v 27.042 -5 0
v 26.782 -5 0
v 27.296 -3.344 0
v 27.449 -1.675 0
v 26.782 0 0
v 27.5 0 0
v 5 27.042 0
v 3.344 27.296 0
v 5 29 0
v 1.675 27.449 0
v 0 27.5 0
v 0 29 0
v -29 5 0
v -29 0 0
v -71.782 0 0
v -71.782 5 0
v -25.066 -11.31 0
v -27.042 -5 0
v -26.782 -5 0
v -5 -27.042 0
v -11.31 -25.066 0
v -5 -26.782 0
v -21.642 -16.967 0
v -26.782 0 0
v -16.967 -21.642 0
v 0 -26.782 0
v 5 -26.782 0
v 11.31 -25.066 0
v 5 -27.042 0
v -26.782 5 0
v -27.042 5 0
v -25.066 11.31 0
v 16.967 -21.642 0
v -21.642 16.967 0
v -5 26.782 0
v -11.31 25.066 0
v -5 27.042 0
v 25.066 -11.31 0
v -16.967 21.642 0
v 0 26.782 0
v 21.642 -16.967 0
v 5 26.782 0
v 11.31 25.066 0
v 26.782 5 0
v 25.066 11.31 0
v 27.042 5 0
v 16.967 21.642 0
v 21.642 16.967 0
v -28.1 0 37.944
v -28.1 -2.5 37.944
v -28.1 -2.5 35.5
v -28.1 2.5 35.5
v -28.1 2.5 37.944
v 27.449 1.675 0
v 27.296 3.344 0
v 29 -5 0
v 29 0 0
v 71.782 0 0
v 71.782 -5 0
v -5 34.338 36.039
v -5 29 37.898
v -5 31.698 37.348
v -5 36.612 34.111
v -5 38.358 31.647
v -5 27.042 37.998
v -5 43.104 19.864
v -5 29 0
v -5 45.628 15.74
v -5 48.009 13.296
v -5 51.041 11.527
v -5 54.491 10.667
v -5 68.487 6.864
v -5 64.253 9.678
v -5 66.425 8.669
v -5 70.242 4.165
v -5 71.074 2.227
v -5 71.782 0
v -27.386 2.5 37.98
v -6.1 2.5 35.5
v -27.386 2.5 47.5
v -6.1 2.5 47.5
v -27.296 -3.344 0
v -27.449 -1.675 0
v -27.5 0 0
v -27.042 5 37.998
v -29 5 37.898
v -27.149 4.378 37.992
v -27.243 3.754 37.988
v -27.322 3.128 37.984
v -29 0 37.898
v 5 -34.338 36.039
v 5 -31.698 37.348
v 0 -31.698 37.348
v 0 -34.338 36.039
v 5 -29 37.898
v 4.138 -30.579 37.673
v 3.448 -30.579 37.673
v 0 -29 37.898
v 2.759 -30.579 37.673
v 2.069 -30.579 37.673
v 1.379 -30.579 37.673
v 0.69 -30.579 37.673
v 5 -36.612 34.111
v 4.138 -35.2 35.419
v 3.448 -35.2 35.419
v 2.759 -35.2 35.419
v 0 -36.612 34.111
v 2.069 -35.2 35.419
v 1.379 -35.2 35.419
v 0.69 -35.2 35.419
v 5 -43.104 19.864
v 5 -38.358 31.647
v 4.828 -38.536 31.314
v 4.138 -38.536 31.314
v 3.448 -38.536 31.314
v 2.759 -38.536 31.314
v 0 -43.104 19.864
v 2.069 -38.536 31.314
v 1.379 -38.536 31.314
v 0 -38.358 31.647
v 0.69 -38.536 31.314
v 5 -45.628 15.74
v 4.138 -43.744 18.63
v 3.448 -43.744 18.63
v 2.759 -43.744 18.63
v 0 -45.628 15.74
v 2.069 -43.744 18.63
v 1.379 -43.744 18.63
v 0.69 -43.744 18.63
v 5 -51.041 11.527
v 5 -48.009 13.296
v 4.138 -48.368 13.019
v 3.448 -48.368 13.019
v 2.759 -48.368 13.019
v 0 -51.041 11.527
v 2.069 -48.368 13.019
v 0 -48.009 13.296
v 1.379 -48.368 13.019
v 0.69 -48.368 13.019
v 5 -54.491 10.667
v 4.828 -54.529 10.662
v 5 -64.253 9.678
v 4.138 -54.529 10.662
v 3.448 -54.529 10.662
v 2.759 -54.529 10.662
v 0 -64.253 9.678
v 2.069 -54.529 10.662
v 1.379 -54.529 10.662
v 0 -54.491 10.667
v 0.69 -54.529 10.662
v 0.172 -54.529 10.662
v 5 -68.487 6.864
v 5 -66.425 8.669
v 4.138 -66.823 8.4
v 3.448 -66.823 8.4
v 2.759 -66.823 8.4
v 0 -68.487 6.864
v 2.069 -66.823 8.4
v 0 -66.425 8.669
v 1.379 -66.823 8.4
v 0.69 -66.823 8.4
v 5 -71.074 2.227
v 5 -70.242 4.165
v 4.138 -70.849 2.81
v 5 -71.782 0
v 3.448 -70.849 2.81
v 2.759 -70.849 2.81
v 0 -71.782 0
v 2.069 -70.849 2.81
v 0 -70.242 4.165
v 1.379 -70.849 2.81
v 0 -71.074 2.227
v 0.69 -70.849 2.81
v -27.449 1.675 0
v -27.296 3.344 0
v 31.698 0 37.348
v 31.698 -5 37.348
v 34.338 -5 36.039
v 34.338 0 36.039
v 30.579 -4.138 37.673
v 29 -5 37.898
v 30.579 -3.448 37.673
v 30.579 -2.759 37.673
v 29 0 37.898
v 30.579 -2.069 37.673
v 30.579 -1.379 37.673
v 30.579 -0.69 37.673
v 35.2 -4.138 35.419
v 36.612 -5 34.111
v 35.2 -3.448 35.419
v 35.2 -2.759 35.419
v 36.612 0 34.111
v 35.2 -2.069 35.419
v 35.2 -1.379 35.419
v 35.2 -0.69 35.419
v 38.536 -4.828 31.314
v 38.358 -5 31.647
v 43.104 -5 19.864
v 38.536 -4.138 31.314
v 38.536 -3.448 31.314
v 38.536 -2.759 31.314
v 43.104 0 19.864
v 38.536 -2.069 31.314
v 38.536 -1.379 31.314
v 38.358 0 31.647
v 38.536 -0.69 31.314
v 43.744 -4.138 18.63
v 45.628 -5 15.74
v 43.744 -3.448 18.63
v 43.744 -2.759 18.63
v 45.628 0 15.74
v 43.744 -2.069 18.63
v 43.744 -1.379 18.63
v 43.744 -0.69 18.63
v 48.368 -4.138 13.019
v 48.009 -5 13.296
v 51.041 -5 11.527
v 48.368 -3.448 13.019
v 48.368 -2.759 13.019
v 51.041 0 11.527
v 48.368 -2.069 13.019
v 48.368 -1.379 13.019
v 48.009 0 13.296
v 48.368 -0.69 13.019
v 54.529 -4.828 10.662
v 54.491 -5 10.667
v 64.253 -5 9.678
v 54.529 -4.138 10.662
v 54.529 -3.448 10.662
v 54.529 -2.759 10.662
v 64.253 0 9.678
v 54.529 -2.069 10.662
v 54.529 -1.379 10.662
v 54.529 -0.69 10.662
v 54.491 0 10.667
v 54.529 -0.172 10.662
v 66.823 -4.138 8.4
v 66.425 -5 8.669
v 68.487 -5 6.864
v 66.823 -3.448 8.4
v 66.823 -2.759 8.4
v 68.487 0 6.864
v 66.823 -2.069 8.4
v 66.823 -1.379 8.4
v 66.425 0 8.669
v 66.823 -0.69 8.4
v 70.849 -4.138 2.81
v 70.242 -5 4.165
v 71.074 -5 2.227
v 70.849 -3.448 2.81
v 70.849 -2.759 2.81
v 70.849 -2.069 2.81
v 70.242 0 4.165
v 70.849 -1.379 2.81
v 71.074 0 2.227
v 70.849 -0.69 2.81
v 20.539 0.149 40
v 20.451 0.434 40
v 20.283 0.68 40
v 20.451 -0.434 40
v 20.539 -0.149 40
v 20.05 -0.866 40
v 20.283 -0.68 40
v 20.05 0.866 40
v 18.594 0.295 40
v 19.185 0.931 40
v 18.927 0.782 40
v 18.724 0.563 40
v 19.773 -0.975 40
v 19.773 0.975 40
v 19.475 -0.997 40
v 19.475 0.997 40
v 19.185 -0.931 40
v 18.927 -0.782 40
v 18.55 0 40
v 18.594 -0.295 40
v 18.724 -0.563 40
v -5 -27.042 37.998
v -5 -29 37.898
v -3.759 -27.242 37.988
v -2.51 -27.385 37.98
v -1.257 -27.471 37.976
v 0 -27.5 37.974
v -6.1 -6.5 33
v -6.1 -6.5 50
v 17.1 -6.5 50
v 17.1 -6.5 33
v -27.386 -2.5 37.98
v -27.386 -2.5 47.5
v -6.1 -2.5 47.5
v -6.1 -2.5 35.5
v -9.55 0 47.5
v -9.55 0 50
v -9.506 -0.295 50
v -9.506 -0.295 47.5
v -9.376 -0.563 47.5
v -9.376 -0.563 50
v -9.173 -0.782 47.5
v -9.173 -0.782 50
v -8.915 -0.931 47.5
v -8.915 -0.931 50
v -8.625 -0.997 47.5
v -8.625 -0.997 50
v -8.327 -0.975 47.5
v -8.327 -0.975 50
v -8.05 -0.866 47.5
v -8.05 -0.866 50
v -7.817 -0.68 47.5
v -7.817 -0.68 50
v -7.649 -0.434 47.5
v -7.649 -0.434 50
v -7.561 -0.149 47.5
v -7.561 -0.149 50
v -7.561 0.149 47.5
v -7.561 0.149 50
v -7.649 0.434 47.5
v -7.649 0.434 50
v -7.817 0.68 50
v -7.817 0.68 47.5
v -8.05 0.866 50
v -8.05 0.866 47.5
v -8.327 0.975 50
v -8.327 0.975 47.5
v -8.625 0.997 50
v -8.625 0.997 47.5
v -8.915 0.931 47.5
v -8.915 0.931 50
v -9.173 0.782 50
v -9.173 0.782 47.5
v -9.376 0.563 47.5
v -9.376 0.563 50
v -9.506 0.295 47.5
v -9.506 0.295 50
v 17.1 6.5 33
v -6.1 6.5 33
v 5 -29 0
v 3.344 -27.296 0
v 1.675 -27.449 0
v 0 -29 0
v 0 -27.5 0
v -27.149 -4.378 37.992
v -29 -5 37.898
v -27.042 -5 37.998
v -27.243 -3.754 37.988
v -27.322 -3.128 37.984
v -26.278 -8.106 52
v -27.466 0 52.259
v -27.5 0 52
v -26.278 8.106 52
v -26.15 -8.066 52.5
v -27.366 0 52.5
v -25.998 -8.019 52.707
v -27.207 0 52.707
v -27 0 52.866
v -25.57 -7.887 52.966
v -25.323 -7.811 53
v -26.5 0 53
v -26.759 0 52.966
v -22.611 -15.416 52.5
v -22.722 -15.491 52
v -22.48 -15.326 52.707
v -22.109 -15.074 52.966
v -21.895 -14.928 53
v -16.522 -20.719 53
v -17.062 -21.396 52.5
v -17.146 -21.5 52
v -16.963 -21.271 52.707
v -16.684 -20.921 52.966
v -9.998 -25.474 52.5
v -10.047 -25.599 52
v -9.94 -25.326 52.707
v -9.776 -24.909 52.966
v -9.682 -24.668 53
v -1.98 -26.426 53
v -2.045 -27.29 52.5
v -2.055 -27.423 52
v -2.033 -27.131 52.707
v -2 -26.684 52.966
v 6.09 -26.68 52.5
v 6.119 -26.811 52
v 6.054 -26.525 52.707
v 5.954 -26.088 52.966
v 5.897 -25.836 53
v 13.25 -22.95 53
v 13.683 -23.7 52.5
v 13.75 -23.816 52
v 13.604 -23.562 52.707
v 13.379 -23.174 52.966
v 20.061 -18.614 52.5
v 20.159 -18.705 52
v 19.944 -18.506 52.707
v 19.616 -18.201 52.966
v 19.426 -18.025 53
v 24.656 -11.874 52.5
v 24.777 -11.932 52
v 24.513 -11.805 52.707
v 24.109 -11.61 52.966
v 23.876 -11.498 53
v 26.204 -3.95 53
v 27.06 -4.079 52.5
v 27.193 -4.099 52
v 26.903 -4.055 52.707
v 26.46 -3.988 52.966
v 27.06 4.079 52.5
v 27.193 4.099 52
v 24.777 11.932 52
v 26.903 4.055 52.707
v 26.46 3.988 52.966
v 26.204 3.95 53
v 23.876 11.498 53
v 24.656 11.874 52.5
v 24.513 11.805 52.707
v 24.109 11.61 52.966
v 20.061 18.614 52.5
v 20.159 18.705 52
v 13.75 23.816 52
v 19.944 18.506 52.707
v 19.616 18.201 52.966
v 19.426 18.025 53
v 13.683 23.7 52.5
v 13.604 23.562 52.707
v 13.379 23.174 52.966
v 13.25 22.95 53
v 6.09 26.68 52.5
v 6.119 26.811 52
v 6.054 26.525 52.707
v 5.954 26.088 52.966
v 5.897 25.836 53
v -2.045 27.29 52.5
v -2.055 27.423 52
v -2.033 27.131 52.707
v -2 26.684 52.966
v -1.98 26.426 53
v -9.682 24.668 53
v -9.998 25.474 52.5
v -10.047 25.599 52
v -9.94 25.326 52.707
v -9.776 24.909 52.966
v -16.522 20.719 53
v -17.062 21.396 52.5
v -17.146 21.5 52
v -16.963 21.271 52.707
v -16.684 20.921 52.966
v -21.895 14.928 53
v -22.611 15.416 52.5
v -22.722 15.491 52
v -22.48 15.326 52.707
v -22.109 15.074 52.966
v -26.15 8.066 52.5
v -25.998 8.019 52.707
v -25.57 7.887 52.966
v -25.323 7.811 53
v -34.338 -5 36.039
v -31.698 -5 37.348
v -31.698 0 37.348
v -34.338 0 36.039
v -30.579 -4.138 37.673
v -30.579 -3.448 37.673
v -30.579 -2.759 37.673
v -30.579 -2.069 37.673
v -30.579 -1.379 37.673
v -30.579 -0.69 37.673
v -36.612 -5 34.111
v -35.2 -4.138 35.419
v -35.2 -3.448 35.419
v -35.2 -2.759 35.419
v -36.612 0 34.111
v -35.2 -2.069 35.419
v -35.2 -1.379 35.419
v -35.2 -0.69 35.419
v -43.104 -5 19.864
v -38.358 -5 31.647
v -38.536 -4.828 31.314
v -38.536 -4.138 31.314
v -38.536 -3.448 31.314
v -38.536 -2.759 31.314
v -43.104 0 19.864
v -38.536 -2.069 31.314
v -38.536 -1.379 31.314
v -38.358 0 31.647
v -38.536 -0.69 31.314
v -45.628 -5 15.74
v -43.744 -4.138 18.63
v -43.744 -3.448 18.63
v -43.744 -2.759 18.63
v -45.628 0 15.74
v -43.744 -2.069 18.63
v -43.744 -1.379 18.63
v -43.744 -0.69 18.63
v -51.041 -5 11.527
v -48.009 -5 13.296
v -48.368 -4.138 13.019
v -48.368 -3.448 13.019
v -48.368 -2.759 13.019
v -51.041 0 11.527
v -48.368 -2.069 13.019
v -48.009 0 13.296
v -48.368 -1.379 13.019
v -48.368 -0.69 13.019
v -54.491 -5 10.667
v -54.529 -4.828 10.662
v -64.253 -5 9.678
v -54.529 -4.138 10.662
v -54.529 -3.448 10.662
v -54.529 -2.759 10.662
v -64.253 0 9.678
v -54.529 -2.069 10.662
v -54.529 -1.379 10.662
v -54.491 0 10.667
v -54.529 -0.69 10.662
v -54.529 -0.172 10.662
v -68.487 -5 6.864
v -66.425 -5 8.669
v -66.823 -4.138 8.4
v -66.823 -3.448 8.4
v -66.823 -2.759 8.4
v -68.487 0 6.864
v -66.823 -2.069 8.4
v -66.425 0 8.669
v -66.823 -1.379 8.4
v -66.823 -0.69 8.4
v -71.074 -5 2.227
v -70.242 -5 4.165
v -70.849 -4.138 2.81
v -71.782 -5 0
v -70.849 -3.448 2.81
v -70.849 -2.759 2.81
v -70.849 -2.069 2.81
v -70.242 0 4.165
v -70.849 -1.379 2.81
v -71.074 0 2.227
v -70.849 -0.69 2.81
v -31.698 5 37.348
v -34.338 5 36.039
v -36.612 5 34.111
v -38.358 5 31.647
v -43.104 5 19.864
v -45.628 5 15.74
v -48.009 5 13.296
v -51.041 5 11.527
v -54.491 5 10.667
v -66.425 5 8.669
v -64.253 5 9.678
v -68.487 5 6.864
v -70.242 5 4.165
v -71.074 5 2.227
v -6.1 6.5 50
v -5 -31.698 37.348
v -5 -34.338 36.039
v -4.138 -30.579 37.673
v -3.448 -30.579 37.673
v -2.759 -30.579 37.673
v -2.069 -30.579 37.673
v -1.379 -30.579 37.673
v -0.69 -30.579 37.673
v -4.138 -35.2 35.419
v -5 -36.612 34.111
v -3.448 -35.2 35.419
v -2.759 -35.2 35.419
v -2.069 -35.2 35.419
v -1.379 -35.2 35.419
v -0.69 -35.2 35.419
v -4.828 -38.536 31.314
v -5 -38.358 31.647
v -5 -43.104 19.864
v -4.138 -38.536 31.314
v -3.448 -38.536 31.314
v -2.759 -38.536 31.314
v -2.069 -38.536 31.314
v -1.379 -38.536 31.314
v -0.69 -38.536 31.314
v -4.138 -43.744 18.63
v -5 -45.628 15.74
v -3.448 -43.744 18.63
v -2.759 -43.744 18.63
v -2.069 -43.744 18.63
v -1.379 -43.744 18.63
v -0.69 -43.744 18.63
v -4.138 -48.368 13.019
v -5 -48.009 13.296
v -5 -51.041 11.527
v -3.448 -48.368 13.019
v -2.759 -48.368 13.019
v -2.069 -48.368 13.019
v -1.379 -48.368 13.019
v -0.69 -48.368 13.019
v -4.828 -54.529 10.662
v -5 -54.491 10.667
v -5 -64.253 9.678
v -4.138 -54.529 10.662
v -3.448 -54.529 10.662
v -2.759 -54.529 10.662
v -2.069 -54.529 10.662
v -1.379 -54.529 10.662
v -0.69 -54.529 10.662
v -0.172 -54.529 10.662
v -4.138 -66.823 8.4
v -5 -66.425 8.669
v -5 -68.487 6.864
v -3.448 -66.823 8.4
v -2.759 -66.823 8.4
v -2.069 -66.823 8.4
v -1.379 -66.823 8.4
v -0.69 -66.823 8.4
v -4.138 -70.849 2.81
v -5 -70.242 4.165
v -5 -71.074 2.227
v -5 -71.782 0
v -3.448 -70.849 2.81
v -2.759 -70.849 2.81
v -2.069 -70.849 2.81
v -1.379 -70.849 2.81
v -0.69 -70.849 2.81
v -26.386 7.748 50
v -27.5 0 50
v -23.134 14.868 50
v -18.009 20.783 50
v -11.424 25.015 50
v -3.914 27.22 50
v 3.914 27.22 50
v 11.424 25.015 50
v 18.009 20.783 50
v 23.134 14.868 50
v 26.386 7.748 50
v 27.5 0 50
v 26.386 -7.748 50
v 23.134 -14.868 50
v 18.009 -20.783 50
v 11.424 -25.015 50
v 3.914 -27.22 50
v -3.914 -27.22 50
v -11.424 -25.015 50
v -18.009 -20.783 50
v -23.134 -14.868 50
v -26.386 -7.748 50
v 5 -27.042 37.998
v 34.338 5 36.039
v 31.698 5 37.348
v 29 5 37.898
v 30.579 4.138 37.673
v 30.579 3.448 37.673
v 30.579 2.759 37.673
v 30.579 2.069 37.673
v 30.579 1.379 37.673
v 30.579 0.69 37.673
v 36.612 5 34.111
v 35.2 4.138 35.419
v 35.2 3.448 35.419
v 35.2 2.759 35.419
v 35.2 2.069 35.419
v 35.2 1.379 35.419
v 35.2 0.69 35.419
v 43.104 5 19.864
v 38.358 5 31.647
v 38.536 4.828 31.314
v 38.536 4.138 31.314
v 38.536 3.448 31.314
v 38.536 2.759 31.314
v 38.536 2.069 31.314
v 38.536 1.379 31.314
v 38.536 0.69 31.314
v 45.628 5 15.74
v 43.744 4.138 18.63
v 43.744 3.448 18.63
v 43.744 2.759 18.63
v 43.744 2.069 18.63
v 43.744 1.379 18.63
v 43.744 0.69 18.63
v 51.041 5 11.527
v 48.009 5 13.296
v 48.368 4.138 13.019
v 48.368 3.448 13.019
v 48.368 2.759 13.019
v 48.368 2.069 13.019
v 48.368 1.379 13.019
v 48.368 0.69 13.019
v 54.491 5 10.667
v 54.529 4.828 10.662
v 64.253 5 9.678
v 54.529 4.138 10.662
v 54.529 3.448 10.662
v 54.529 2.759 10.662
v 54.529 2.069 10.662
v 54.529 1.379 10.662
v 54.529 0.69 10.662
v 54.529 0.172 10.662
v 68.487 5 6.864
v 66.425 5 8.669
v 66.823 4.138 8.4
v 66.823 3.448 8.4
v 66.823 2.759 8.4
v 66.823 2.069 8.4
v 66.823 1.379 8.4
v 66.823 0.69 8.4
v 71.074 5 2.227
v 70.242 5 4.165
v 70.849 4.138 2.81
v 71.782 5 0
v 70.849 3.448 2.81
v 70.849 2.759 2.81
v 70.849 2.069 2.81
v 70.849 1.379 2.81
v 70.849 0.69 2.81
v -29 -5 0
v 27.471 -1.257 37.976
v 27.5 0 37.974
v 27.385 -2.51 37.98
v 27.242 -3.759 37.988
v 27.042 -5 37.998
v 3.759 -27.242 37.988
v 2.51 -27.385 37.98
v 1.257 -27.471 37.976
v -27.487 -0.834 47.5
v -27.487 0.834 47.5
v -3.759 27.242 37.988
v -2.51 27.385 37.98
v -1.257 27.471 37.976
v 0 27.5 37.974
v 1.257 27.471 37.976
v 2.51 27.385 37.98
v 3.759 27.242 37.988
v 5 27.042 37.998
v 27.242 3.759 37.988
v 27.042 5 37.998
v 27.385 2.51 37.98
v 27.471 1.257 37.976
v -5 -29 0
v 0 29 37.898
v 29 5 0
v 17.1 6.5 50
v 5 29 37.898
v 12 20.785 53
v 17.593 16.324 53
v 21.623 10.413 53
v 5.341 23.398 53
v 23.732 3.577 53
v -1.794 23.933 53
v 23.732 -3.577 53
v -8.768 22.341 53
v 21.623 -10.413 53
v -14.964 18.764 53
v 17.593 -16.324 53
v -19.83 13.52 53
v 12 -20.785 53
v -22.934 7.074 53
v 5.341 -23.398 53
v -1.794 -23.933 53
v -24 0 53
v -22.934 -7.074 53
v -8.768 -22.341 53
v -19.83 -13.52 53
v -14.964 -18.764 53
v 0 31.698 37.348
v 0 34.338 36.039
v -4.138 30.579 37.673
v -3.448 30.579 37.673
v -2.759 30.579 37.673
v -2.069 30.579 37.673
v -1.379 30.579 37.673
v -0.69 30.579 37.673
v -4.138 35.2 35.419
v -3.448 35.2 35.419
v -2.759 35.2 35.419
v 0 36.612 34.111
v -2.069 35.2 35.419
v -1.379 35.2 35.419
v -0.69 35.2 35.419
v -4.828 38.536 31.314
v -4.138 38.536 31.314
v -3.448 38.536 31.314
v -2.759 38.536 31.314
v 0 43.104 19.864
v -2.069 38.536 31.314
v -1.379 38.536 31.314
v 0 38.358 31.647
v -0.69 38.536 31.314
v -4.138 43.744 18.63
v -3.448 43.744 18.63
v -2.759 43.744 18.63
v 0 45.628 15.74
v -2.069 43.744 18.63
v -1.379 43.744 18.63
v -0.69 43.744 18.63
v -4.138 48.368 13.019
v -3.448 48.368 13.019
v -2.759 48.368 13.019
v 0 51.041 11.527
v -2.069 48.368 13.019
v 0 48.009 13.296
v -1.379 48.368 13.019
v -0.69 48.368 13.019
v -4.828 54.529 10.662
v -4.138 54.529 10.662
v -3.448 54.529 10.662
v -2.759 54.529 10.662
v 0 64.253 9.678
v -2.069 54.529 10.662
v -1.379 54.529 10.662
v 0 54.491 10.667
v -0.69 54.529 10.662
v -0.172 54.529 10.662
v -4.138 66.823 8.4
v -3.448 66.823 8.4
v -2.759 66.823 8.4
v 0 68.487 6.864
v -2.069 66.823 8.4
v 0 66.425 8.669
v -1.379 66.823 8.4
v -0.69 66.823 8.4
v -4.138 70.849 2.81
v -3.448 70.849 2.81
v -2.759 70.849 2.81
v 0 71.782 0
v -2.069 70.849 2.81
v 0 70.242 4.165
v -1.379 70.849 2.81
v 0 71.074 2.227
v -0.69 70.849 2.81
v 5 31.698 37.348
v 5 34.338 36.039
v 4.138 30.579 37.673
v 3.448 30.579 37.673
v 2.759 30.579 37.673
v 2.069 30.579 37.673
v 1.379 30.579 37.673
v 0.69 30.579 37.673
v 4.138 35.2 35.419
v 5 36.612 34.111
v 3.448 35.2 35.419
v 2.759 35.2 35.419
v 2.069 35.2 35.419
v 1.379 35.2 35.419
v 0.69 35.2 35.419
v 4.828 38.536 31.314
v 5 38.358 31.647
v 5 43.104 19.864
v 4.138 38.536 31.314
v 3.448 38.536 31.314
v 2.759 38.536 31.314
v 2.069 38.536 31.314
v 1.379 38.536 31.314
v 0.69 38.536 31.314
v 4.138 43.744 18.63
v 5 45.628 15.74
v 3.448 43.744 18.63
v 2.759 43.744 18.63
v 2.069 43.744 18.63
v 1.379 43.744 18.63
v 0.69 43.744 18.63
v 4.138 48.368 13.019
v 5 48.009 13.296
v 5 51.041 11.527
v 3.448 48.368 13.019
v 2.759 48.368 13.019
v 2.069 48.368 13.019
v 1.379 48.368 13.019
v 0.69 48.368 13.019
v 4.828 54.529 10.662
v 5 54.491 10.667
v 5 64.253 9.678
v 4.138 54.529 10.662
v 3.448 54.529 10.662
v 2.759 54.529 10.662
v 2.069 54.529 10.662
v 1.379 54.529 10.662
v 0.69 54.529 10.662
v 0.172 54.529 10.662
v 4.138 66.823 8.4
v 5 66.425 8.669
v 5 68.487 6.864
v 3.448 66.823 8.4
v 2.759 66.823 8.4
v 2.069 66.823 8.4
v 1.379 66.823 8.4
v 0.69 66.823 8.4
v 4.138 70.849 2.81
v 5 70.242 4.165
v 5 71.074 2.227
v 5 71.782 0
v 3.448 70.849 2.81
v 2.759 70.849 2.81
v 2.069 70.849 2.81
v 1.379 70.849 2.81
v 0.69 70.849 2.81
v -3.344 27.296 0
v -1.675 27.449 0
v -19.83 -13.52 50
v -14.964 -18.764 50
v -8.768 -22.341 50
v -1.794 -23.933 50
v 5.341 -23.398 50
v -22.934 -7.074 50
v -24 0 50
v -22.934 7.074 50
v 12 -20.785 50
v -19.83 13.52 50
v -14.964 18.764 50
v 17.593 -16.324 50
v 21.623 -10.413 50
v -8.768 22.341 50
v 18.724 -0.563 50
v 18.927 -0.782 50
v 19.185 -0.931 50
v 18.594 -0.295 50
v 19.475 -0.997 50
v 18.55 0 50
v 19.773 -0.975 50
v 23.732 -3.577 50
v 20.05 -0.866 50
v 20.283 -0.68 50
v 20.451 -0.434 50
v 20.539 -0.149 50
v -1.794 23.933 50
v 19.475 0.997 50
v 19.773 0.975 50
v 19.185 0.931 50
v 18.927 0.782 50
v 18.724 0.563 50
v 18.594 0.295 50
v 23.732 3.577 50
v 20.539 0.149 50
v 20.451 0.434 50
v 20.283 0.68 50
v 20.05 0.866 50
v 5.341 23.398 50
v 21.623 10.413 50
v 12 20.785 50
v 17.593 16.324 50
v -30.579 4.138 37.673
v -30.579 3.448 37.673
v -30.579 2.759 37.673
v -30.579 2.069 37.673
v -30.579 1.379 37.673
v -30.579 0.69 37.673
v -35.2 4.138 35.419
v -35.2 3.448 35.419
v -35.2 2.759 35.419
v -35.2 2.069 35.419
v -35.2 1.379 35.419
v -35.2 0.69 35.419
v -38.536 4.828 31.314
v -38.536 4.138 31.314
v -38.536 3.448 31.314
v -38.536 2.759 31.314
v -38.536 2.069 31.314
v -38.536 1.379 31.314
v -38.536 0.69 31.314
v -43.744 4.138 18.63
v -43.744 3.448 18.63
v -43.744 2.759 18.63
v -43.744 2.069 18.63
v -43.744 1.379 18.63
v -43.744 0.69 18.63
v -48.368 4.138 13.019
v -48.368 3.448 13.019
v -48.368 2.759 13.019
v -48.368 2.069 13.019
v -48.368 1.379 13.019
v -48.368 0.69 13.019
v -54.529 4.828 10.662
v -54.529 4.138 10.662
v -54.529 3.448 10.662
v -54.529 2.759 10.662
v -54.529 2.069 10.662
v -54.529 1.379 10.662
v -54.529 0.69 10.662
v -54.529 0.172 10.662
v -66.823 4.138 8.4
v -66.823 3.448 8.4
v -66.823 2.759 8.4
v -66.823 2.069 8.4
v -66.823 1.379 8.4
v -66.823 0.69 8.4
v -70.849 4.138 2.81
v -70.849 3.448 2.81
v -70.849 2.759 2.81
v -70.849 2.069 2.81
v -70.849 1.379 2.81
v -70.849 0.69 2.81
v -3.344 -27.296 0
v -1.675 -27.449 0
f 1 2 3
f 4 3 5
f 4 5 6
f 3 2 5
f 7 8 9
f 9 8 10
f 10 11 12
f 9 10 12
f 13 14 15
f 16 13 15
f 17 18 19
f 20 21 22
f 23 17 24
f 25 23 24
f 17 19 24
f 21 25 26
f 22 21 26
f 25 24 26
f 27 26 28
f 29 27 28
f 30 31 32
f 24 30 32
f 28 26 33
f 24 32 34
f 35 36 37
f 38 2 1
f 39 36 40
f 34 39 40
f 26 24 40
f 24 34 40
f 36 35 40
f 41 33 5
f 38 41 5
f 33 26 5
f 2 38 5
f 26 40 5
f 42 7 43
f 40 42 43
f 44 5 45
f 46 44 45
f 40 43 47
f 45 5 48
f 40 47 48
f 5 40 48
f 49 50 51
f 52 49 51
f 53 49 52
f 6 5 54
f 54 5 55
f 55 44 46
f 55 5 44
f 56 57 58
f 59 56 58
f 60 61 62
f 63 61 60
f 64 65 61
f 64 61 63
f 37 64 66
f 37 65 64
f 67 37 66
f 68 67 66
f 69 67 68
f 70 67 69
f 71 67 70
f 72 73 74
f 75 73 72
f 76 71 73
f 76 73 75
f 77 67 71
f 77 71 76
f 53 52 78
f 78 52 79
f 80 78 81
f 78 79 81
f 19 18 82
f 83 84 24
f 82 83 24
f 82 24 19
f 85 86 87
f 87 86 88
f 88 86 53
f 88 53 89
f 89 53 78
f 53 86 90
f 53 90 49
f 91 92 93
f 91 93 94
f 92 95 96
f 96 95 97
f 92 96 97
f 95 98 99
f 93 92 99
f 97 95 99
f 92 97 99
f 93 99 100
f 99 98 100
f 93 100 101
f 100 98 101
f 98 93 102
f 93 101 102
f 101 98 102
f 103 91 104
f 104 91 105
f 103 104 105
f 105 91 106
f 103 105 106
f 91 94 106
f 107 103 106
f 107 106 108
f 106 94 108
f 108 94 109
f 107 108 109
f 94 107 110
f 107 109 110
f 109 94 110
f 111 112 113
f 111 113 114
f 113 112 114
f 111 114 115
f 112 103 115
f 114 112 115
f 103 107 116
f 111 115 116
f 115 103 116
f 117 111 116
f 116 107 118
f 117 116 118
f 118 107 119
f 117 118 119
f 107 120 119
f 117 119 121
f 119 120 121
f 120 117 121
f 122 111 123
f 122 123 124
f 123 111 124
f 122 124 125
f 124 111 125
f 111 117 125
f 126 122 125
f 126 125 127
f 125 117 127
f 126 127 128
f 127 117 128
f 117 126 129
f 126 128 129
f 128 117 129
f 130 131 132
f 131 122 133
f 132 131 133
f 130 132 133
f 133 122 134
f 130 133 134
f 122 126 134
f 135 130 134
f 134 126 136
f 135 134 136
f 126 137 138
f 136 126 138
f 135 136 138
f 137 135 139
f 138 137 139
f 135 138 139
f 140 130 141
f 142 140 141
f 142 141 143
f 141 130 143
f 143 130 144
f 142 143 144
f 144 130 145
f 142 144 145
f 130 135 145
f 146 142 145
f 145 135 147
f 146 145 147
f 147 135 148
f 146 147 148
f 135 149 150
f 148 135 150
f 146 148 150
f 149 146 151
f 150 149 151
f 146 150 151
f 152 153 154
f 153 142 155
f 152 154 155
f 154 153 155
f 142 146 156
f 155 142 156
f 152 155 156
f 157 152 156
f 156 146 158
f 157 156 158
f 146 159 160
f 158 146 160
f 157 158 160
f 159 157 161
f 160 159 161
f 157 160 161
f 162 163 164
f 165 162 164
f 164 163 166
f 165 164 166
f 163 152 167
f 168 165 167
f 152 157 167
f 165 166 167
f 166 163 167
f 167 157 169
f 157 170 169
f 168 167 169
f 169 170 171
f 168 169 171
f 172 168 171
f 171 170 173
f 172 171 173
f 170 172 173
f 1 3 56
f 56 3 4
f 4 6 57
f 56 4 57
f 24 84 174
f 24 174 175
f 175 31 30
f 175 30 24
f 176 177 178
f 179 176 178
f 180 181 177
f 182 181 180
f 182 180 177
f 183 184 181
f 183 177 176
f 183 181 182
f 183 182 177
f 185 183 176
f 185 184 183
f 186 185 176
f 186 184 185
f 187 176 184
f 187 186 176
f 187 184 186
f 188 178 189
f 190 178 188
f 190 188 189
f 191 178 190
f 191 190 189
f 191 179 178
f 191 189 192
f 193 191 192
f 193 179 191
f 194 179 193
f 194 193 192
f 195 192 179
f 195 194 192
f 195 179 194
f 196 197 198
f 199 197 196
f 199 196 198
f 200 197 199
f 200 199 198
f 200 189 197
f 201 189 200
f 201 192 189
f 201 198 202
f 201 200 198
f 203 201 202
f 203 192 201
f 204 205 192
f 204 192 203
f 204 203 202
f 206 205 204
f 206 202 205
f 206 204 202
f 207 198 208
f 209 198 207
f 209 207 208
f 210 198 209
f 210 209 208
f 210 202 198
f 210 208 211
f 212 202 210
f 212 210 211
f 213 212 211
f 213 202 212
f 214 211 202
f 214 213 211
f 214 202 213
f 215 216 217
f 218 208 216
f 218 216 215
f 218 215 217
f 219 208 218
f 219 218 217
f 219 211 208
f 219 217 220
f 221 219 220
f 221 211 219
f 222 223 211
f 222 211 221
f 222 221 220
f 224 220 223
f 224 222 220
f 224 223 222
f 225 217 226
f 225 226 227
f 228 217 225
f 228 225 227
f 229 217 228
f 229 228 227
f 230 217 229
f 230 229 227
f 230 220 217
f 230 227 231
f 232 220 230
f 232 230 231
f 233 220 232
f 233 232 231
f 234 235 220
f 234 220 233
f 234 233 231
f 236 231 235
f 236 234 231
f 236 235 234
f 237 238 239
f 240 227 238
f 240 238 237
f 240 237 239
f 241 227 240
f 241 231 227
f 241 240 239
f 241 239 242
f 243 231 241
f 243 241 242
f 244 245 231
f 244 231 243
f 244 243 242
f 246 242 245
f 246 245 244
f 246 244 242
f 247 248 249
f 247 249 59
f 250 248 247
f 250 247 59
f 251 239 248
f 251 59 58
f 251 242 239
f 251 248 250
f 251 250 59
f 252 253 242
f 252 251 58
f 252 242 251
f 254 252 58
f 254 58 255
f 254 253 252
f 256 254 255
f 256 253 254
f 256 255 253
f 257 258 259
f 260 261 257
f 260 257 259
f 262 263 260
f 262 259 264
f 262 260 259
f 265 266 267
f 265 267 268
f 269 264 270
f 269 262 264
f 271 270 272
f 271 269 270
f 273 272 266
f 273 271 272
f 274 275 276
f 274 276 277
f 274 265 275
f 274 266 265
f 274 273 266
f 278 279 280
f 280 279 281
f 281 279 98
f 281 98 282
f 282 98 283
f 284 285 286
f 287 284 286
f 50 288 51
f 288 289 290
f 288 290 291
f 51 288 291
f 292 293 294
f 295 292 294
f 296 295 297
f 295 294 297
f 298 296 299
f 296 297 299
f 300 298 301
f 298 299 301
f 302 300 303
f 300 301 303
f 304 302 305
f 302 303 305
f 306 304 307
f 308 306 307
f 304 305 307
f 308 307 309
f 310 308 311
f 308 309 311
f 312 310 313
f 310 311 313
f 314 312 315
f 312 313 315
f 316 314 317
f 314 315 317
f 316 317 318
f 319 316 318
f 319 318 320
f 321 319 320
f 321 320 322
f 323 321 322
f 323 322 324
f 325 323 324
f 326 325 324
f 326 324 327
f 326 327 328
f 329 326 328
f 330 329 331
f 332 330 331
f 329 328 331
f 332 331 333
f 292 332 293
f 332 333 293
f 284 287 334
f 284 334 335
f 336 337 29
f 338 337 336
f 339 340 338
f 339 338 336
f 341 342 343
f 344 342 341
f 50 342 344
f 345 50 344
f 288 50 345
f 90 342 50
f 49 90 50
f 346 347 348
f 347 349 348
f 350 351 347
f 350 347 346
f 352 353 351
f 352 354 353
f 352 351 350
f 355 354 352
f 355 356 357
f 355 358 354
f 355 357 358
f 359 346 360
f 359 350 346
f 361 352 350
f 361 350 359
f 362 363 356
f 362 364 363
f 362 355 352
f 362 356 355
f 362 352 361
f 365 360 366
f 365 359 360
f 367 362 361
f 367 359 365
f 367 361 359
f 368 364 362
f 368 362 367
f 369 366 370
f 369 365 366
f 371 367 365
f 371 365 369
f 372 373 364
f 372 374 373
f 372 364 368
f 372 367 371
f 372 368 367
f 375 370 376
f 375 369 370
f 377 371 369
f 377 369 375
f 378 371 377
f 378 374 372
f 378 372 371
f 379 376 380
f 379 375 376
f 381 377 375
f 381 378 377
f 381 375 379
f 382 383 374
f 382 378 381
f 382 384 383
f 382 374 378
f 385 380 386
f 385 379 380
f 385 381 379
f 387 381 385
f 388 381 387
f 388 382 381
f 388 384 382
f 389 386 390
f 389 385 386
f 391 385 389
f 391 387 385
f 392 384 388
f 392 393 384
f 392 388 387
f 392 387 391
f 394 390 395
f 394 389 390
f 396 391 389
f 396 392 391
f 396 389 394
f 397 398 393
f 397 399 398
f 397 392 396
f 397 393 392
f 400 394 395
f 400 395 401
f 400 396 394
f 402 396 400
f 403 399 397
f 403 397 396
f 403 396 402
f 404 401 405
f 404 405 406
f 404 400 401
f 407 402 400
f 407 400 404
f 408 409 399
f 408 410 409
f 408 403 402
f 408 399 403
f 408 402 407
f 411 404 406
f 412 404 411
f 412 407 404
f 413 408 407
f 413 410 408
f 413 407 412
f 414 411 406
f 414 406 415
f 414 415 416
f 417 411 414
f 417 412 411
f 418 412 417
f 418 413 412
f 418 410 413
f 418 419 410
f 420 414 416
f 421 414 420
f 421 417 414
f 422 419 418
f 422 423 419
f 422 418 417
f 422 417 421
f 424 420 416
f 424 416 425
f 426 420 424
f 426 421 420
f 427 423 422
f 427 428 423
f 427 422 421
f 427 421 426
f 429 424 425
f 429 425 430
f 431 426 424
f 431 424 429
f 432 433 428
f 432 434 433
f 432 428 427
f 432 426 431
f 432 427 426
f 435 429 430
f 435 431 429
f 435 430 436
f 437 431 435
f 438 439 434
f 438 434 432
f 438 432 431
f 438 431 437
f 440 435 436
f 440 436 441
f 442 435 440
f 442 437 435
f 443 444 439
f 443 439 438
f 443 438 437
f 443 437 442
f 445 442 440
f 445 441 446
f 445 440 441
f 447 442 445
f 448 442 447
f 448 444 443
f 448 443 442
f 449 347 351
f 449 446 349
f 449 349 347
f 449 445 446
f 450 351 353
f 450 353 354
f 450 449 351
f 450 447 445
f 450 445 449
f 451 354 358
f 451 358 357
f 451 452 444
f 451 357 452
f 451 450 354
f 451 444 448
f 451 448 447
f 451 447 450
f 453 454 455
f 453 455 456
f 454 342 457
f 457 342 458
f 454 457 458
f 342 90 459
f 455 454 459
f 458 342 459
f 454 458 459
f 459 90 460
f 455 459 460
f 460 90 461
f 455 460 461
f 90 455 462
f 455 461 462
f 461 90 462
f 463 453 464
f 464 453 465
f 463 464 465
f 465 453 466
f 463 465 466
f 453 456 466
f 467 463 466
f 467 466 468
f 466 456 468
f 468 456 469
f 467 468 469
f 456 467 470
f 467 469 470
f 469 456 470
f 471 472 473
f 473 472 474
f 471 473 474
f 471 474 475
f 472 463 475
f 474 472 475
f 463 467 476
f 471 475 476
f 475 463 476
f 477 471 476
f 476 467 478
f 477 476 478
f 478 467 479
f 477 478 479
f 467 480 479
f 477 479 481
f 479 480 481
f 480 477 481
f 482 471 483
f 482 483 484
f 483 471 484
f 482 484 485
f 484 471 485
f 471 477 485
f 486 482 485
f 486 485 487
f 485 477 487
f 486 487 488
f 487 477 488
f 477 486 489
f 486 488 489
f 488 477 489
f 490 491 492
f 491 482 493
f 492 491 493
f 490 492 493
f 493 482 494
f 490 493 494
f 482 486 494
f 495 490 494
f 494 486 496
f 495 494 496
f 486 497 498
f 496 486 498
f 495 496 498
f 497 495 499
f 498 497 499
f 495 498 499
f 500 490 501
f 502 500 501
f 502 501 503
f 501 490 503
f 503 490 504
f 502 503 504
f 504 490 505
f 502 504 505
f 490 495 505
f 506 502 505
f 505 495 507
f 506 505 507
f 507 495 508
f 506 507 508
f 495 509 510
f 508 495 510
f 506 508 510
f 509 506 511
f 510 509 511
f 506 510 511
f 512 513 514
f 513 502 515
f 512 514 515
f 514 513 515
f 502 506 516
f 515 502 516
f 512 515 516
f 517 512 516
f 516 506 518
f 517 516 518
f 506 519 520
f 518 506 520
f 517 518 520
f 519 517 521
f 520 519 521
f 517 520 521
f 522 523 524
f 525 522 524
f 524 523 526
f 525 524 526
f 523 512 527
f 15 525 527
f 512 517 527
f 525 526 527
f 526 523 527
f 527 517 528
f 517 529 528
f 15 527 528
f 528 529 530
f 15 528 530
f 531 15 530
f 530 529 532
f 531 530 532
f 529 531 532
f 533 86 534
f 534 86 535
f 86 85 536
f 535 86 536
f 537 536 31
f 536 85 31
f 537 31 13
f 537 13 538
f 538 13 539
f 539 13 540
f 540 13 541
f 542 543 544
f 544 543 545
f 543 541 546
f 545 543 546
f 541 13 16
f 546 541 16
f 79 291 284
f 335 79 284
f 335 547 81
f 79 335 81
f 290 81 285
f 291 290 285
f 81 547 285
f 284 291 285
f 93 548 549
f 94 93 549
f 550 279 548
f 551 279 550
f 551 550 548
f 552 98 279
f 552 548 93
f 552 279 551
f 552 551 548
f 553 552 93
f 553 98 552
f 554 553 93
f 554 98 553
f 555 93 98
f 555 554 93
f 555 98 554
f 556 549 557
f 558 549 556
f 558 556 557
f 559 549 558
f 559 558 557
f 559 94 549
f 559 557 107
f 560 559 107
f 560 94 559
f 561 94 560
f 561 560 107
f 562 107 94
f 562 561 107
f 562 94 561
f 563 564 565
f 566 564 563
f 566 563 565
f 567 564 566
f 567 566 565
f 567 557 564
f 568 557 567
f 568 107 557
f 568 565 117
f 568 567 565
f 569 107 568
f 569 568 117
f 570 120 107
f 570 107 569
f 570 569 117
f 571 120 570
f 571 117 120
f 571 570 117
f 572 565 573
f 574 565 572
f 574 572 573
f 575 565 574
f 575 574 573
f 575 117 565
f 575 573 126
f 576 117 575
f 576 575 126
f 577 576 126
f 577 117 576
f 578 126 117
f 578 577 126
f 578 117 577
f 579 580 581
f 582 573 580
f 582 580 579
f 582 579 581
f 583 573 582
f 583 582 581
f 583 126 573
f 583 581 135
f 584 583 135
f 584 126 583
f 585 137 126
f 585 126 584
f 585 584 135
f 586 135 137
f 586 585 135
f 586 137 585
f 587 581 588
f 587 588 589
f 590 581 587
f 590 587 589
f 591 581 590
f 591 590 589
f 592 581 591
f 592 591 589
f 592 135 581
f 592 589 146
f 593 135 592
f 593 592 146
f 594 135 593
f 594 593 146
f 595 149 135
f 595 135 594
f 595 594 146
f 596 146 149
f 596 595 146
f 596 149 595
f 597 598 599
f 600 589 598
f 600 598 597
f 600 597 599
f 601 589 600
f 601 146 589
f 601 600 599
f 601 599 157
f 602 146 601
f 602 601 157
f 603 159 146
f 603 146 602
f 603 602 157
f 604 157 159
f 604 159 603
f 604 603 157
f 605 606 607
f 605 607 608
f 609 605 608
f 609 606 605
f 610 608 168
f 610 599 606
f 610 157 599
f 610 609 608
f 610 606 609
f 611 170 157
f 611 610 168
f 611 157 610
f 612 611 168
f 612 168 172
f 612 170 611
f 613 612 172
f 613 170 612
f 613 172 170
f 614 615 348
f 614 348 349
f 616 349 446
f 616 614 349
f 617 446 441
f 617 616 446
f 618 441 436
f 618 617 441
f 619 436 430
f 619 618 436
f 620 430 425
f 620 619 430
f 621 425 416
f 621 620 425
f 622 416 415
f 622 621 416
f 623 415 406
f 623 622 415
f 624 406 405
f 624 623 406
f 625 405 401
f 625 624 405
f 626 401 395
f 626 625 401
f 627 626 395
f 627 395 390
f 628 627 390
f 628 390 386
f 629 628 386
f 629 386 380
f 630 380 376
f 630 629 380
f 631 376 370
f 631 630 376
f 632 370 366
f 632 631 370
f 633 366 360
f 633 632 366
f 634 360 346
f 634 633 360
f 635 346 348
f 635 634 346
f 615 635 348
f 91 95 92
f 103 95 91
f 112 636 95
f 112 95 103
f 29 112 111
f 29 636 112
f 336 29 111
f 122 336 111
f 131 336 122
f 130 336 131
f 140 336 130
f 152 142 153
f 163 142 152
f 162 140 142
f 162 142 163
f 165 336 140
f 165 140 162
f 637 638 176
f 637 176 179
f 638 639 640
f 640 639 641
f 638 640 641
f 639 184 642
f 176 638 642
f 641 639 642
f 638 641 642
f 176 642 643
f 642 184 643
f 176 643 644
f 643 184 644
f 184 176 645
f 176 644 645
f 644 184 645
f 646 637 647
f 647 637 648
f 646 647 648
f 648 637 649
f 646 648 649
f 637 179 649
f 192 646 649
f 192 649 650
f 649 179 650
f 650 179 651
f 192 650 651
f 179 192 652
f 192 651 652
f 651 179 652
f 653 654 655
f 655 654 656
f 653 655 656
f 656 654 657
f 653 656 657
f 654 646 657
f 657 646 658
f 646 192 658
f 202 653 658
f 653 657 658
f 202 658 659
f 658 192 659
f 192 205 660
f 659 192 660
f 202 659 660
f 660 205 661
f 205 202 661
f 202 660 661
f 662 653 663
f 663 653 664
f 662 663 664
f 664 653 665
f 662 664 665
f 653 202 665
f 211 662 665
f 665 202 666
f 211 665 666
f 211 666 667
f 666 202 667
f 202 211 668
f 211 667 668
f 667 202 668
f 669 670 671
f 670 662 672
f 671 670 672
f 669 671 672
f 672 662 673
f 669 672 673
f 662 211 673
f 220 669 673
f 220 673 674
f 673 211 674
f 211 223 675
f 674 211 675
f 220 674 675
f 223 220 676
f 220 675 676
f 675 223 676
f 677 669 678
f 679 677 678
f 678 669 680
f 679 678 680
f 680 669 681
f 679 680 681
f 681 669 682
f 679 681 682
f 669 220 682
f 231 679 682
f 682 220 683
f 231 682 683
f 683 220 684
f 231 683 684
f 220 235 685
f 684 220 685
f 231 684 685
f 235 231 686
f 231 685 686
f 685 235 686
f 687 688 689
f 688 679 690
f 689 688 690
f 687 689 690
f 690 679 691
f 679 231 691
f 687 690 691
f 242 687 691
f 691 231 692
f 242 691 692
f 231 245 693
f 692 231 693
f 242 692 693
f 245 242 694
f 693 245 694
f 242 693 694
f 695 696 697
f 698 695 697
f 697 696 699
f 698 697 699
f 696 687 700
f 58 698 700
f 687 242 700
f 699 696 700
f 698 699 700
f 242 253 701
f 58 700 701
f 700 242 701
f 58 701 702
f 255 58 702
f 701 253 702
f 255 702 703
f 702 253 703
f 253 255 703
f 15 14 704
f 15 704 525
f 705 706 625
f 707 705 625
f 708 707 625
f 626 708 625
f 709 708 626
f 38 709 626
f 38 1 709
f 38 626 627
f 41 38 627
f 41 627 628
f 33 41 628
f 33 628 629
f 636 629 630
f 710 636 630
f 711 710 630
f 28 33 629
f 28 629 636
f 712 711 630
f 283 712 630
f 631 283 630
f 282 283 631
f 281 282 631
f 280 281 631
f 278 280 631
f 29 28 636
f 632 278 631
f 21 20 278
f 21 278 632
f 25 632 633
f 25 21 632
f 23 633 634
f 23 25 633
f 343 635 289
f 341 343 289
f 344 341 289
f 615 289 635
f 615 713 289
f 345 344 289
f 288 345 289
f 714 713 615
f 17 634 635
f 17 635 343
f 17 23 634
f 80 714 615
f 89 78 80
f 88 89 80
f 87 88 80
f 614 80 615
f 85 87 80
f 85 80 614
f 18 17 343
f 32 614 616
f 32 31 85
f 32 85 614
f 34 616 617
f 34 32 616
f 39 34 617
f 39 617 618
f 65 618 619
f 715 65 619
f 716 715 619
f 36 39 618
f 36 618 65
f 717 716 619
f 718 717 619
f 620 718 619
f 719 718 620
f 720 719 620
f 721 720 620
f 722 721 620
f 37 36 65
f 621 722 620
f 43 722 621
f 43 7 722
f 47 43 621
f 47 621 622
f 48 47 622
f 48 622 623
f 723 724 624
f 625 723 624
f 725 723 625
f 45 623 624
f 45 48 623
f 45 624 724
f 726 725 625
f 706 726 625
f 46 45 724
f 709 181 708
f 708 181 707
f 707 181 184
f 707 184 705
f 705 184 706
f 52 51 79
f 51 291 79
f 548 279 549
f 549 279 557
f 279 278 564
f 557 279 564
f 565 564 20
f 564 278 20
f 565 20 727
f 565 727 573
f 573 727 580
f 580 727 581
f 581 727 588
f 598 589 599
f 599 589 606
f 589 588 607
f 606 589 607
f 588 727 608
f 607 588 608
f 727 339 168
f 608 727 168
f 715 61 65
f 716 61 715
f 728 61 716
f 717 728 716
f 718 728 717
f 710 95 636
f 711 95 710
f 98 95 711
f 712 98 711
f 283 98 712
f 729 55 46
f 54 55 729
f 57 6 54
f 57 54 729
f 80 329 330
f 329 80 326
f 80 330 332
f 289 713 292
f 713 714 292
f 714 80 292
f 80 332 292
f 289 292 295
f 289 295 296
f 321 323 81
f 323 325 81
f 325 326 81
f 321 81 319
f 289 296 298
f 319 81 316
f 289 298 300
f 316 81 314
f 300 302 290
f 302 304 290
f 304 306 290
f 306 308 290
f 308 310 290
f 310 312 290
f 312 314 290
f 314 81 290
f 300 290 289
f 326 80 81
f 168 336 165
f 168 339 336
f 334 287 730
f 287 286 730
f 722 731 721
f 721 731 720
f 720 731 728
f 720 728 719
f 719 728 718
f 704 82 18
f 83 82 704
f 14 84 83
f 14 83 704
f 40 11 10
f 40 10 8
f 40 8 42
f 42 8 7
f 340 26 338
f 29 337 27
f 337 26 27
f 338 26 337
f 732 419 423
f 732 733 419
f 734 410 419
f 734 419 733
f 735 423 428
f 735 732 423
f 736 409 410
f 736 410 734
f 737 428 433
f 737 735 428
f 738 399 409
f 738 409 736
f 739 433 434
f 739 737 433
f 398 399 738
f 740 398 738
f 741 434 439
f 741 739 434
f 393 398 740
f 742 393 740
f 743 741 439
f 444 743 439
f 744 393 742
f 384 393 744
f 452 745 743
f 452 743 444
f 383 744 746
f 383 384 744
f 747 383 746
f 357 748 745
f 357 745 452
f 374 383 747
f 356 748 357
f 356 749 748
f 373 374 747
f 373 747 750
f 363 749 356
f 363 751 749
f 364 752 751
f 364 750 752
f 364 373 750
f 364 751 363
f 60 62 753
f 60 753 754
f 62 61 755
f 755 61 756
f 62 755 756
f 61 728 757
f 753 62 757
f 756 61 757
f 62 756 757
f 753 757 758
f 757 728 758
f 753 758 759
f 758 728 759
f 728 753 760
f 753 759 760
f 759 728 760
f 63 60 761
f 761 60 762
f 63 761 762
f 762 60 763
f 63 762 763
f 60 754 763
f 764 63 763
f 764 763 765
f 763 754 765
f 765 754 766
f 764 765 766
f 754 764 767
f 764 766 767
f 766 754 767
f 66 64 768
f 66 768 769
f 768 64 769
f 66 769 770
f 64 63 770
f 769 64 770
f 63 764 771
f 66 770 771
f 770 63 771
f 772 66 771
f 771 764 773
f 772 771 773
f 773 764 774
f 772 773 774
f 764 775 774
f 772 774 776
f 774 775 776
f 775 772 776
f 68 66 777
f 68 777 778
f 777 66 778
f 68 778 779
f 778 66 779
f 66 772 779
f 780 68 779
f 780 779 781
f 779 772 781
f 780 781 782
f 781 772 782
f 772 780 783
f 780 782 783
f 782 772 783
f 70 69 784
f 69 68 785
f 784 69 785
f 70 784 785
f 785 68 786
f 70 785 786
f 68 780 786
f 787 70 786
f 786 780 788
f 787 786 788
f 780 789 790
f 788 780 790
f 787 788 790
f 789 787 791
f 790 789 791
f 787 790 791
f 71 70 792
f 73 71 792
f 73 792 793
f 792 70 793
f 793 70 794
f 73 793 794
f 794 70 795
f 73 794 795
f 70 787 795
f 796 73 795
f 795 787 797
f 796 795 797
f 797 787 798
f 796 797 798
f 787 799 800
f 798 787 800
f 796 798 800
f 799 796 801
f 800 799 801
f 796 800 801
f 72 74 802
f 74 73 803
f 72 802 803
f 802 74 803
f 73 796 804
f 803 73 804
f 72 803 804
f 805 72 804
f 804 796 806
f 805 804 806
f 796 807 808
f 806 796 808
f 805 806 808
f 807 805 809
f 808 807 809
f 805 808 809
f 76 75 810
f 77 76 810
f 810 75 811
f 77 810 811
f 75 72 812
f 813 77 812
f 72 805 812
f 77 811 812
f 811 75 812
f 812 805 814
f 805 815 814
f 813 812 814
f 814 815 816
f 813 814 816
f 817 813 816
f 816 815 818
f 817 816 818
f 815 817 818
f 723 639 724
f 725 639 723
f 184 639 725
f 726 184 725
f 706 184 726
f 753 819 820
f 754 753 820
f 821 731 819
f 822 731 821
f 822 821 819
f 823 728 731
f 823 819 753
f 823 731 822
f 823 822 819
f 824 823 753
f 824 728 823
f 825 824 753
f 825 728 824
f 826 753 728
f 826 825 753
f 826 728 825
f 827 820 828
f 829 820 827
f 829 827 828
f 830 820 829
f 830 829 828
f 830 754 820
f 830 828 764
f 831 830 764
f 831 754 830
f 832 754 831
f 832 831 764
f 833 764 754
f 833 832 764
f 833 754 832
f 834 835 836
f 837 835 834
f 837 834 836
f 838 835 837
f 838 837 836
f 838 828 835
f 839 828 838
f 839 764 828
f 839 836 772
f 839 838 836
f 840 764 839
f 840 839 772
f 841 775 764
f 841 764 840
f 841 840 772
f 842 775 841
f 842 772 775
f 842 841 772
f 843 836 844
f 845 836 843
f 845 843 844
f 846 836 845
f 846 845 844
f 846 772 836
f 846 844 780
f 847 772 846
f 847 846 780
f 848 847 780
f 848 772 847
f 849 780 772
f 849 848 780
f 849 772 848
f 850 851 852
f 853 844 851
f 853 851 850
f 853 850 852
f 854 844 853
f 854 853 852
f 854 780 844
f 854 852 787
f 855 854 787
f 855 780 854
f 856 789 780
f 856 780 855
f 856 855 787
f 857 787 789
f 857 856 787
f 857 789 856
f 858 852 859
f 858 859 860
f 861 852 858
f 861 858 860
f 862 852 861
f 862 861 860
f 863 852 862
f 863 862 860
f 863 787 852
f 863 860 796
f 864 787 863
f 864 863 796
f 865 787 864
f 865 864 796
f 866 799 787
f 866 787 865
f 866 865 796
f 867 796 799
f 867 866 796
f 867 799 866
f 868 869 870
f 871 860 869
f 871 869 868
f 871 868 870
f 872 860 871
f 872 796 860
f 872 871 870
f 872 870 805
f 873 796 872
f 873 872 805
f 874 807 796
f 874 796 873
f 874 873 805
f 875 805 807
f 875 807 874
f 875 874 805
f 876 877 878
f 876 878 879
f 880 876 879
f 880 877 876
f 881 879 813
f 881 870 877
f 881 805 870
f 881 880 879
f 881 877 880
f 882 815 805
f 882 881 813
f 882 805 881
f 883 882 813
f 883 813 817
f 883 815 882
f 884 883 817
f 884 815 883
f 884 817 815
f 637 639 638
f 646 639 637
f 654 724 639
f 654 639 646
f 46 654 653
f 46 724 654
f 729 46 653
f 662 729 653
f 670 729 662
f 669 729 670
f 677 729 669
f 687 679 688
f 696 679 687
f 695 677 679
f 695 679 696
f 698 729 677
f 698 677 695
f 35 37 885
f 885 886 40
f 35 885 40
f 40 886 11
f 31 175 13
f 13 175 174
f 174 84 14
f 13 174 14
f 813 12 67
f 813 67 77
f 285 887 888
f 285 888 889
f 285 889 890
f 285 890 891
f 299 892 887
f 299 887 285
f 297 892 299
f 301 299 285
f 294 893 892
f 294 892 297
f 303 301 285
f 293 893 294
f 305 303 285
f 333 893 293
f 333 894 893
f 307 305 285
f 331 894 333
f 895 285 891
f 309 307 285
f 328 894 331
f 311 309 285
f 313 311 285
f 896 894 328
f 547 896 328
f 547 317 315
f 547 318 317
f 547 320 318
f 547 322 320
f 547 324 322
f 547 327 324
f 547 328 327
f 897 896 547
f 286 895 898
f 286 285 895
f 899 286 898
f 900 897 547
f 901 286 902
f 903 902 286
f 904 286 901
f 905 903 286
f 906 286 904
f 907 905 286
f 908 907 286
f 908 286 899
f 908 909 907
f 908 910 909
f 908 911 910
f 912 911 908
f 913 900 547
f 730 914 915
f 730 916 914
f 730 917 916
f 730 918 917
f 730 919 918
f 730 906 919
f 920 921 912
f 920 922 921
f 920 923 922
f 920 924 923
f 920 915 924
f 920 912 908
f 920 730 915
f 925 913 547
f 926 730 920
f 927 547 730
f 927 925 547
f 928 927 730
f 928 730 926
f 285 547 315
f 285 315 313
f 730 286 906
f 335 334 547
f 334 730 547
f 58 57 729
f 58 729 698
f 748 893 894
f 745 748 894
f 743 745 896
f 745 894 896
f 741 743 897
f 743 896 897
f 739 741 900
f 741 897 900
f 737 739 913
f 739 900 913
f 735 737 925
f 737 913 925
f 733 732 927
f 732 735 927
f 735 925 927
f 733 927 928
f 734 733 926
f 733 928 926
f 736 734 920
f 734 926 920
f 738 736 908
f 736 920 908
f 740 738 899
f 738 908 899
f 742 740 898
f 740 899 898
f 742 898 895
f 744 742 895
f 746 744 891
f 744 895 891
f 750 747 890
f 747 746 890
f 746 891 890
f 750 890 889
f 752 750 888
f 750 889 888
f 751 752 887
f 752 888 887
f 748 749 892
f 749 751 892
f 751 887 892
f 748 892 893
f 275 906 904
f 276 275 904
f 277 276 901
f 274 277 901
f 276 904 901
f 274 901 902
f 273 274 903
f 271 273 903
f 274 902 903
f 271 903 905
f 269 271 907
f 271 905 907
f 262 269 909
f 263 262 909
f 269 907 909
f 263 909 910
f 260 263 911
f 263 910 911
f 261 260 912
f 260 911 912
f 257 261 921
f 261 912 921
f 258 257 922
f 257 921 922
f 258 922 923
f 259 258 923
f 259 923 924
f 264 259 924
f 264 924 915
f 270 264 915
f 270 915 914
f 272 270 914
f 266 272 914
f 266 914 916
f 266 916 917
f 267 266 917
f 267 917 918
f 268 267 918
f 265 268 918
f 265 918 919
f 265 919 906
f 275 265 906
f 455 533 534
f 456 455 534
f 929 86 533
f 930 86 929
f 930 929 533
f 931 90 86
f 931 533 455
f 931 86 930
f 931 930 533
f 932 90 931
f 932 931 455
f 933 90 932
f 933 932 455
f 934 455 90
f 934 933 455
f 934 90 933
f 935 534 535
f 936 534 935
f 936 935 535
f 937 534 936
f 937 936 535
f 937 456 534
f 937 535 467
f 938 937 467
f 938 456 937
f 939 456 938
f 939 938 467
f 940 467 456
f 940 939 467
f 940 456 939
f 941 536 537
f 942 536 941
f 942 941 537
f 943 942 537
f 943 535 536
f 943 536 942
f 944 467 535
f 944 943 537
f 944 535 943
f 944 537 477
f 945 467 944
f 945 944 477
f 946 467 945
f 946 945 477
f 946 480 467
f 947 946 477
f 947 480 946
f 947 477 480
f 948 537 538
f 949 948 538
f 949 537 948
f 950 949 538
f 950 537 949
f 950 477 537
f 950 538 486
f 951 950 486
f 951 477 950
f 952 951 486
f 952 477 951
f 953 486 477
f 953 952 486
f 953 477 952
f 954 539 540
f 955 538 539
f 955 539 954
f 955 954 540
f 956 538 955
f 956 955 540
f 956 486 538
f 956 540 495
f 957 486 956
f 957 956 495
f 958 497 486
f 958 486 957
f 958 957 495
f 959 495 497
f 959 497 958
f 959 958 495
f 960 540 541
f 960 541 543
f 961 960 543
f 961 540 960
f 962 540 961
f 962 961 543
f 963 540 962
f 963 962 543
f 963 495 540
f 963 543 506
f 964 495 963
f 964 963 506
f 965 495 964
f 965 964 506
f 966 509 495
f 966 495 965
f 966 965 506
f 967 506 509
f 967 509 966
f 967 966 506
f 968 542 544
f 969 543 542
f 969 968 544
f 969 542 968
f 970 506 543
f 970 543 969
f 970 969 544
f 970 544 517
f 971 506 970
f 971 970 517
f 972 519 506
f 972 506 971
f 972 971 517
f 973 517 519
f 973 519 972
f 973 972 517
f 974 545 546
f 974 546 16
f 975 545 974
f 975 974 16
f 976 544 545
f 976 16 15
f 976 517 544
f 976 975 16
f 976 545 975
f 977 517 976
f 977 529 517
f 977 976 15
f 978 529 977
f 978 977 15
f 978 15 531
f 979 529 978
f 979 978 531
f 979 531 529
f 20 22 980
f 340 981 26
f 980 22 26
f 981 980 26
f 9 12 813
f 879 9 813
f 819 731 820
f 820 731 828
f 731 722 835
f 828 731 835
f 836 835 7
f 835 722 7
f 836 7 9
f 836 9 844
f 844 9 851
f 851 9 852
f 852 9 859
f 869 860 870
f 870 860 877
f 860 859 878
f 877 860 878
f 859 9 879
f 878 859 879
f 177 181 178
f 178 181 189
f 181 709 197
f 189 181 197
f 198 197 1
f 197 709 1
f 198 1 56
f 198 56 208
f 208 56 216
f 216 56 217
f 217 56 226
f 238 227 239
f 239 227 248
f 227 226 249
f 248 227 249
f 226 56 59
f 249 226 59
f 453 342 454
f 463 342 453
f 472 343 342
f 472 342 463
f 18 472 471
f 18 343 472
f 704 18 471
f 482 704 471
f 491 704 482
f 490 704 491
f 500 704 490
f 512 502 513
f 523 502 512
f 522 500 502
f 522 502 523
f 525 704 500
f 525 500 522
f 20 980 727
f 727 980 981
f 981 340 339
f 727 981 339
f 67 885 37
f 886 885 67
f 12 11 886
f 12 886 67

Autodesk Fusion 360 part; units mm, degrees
sketch "Sketch1" plane through (0, 0, 0) normal (0, 0, 1) x (1, 0, 0)
  circle A0 centre (0, 0) radius 27.5
  dimension "d1" = 55
extrude "Extrude1" add sketch "Sketch1" along normal blind 50
sketch "Sketch2" plane through (0, 0, 0) normal (0, 1, 0) x (1, 0, 0)
  line L0 (29, -50) -> (29, -37.898) construction
  line L1 (29, 0) -> (71.7823, 0)
  spline S0 degree 5 poles (29, -37.898) (29.3615, -37.8796) (30.0907, -37.8033) (31.2034, -37.5708) (32.7047, -37.0332) (34.5058, -36.029) (36.1177, -34.7441) (37.4625, -33.2157) (38.5477, -31.4446) (39.4457, -29.415) (40.2655, -27.1187) (41.1293, -24.5767) (42.1453, -21.8656) (43.3866, -19.1327) (44.8964, -16.5569) (46.6897, -14.3184) (48.7553, -12.5626) (51.0579, -11.3701) (53.5391, -10.714) (56.1219, -10.4581) (58.7202, -10.4029) (61.2479, -10.3181) (63.6265, -9.9787) (65.7954, -9.2037) (67.7174, -7.8813) (69.3719, -5.9478) (70.4746, -3.8904) (71.1769, -2.0576) (71.5897, -0.7073) (71.7823, 0) knots 0 0 0 0 0 0 0.04 0.08 0.12 0.16 0.2 0.24 0.28 0.32 0.36 0.4 0.44 0.48 0.52 0.56 0.6 0.64 0.68 0.72 0.76 0.8 0.84 0.88 0.92 0.96 1 1 1 1 1 1
  line L2 (29, -37.898) -> (27, -38)
  line L3 (27, -38) -> (26.7815, 0)
  line L4 (26.7815, 0) -> (29, 0)
  point P0 (36.1963, -34.5428)
  point P1 (41, -25)
  point P2 (50, -12)
  point P3 (63, -10)
  dimension "d7" = 45
extrude "Extrude2" add sketch "Sketch2" along normal mid plane 10
pattern_circular "C-Pattern1" count 4 over 360 about axis through (0, 0, 50) along (0, 0, 1) of "Extrude2"
sketch "Sketch3" plane through (0, 0, 50) normal (0, 0, 1) x (-1, 0, 0)
  circle A0 centre (0, 0) radius 27.5
  circle A1 centre (0, 0) radius 3.15
  line L0 (-17.1, -6.5) -> (11, -6.5)
  line L1 (11, -6.5) -> (11, 6.5)
  line L2 (11, 6.5) -> (-17.1, 6.5)
  line L3 (-17.1, 6.5) -> (-17.1, -6.5)
  line L4 (6.1, -6.5) -> (6.1, 6.5)
  line L5 (-17.1, 6.5) -> (-22, 6.5)
  line L6 (-22, 6.5) -> (-22, -6.5)
  line L7 (-22, -6.5) -> (-17.1, -6.5)
  line L8 (-22, 0) -> (11, 0) construction
  line L9 (6.1, -6.5) -> (11, 6.5) construction
  line L10 (6.1, 6.5) -> (11, -6.5) construction
  circle A2 centre (8.55, 0) radius 1
  line L11 (-22, -6.5) -> (-17.1, 6.5) construction
  line L12 (-22, 6.5) -> (-17.1, -6.5) construction
  circle A3 centre (-19.55, 0) radius 1
  circle A4 centre (0, 0) radius 24
  dimension "d10" = 6.3
  dimension "d11" = 11
  dimension "d12" = 4.9
  dimension "d13" = 23.2
  dimension "d14" = 4.9
  dimension "d16" = 13
  dimension "d19" = 2
  dimension "d20" = 2
  dimension "d23" = -3.5
extrude "Extrude3" cut sketch "Sketch3" against normal blind 17 contours A1 | L0 L2 L3 L4
extrude "Extrude4" cut sketch "Sketch3" against normal blind 10 contours A2 | A3
extrude "Extrude5" add sketch "Sketch3" along normal blind 3 contours A0
fillet "Fillet1" radius 1 1 edges at (25.639, 9.9444, 53)
sketch "Sketch4" plane through (-6.1, 0, 0) normal (1, 0, 0) x (0, 1, 0)
  line L0 (6.5, 50) -> (-6.5, 50)
  line L1 (-6.5, 50) -> (-6.5, 33)
  line L2 (-6.5, 33) -> (6.5, 33)
  line L3 (6.5, 33) -> (6.5, 50)
  line L4 (-6.5, 50) -> (6.5, 50) construction
  line L5 (6.5, 50) -> (6.5, 33) construction
  line L6 (6.5, 33) -> (-6.5, 33) construction
  line L7 (-6.5, 33) -> (-6.5, 50) construction
  line L8 (2.5, 47.5) -> (-2.5, 47.5)
  line L9 (-2.5, 47.5) -> (-2.5, 35.5)
  line L10 (-2.5, 35.5) -> (2.5, 35.5)
  line L11 (2.5, 35.5) -> (2.5, 47.5)
  line L12 (2.5, 47.5) -> (-2.5, 35.5) construction
  line L13 (-2.5, 47.5) -> (2.5, 35.5) construction
  point P0 (0, 41.5)
  dimension "d28" = 5
  dimension "d29" = 12
  dimension "d30" = 2.5
extrude "Extrude6" cut sketch "Sketch4" against normal blind 22 contours L8 L9 L10 L11
